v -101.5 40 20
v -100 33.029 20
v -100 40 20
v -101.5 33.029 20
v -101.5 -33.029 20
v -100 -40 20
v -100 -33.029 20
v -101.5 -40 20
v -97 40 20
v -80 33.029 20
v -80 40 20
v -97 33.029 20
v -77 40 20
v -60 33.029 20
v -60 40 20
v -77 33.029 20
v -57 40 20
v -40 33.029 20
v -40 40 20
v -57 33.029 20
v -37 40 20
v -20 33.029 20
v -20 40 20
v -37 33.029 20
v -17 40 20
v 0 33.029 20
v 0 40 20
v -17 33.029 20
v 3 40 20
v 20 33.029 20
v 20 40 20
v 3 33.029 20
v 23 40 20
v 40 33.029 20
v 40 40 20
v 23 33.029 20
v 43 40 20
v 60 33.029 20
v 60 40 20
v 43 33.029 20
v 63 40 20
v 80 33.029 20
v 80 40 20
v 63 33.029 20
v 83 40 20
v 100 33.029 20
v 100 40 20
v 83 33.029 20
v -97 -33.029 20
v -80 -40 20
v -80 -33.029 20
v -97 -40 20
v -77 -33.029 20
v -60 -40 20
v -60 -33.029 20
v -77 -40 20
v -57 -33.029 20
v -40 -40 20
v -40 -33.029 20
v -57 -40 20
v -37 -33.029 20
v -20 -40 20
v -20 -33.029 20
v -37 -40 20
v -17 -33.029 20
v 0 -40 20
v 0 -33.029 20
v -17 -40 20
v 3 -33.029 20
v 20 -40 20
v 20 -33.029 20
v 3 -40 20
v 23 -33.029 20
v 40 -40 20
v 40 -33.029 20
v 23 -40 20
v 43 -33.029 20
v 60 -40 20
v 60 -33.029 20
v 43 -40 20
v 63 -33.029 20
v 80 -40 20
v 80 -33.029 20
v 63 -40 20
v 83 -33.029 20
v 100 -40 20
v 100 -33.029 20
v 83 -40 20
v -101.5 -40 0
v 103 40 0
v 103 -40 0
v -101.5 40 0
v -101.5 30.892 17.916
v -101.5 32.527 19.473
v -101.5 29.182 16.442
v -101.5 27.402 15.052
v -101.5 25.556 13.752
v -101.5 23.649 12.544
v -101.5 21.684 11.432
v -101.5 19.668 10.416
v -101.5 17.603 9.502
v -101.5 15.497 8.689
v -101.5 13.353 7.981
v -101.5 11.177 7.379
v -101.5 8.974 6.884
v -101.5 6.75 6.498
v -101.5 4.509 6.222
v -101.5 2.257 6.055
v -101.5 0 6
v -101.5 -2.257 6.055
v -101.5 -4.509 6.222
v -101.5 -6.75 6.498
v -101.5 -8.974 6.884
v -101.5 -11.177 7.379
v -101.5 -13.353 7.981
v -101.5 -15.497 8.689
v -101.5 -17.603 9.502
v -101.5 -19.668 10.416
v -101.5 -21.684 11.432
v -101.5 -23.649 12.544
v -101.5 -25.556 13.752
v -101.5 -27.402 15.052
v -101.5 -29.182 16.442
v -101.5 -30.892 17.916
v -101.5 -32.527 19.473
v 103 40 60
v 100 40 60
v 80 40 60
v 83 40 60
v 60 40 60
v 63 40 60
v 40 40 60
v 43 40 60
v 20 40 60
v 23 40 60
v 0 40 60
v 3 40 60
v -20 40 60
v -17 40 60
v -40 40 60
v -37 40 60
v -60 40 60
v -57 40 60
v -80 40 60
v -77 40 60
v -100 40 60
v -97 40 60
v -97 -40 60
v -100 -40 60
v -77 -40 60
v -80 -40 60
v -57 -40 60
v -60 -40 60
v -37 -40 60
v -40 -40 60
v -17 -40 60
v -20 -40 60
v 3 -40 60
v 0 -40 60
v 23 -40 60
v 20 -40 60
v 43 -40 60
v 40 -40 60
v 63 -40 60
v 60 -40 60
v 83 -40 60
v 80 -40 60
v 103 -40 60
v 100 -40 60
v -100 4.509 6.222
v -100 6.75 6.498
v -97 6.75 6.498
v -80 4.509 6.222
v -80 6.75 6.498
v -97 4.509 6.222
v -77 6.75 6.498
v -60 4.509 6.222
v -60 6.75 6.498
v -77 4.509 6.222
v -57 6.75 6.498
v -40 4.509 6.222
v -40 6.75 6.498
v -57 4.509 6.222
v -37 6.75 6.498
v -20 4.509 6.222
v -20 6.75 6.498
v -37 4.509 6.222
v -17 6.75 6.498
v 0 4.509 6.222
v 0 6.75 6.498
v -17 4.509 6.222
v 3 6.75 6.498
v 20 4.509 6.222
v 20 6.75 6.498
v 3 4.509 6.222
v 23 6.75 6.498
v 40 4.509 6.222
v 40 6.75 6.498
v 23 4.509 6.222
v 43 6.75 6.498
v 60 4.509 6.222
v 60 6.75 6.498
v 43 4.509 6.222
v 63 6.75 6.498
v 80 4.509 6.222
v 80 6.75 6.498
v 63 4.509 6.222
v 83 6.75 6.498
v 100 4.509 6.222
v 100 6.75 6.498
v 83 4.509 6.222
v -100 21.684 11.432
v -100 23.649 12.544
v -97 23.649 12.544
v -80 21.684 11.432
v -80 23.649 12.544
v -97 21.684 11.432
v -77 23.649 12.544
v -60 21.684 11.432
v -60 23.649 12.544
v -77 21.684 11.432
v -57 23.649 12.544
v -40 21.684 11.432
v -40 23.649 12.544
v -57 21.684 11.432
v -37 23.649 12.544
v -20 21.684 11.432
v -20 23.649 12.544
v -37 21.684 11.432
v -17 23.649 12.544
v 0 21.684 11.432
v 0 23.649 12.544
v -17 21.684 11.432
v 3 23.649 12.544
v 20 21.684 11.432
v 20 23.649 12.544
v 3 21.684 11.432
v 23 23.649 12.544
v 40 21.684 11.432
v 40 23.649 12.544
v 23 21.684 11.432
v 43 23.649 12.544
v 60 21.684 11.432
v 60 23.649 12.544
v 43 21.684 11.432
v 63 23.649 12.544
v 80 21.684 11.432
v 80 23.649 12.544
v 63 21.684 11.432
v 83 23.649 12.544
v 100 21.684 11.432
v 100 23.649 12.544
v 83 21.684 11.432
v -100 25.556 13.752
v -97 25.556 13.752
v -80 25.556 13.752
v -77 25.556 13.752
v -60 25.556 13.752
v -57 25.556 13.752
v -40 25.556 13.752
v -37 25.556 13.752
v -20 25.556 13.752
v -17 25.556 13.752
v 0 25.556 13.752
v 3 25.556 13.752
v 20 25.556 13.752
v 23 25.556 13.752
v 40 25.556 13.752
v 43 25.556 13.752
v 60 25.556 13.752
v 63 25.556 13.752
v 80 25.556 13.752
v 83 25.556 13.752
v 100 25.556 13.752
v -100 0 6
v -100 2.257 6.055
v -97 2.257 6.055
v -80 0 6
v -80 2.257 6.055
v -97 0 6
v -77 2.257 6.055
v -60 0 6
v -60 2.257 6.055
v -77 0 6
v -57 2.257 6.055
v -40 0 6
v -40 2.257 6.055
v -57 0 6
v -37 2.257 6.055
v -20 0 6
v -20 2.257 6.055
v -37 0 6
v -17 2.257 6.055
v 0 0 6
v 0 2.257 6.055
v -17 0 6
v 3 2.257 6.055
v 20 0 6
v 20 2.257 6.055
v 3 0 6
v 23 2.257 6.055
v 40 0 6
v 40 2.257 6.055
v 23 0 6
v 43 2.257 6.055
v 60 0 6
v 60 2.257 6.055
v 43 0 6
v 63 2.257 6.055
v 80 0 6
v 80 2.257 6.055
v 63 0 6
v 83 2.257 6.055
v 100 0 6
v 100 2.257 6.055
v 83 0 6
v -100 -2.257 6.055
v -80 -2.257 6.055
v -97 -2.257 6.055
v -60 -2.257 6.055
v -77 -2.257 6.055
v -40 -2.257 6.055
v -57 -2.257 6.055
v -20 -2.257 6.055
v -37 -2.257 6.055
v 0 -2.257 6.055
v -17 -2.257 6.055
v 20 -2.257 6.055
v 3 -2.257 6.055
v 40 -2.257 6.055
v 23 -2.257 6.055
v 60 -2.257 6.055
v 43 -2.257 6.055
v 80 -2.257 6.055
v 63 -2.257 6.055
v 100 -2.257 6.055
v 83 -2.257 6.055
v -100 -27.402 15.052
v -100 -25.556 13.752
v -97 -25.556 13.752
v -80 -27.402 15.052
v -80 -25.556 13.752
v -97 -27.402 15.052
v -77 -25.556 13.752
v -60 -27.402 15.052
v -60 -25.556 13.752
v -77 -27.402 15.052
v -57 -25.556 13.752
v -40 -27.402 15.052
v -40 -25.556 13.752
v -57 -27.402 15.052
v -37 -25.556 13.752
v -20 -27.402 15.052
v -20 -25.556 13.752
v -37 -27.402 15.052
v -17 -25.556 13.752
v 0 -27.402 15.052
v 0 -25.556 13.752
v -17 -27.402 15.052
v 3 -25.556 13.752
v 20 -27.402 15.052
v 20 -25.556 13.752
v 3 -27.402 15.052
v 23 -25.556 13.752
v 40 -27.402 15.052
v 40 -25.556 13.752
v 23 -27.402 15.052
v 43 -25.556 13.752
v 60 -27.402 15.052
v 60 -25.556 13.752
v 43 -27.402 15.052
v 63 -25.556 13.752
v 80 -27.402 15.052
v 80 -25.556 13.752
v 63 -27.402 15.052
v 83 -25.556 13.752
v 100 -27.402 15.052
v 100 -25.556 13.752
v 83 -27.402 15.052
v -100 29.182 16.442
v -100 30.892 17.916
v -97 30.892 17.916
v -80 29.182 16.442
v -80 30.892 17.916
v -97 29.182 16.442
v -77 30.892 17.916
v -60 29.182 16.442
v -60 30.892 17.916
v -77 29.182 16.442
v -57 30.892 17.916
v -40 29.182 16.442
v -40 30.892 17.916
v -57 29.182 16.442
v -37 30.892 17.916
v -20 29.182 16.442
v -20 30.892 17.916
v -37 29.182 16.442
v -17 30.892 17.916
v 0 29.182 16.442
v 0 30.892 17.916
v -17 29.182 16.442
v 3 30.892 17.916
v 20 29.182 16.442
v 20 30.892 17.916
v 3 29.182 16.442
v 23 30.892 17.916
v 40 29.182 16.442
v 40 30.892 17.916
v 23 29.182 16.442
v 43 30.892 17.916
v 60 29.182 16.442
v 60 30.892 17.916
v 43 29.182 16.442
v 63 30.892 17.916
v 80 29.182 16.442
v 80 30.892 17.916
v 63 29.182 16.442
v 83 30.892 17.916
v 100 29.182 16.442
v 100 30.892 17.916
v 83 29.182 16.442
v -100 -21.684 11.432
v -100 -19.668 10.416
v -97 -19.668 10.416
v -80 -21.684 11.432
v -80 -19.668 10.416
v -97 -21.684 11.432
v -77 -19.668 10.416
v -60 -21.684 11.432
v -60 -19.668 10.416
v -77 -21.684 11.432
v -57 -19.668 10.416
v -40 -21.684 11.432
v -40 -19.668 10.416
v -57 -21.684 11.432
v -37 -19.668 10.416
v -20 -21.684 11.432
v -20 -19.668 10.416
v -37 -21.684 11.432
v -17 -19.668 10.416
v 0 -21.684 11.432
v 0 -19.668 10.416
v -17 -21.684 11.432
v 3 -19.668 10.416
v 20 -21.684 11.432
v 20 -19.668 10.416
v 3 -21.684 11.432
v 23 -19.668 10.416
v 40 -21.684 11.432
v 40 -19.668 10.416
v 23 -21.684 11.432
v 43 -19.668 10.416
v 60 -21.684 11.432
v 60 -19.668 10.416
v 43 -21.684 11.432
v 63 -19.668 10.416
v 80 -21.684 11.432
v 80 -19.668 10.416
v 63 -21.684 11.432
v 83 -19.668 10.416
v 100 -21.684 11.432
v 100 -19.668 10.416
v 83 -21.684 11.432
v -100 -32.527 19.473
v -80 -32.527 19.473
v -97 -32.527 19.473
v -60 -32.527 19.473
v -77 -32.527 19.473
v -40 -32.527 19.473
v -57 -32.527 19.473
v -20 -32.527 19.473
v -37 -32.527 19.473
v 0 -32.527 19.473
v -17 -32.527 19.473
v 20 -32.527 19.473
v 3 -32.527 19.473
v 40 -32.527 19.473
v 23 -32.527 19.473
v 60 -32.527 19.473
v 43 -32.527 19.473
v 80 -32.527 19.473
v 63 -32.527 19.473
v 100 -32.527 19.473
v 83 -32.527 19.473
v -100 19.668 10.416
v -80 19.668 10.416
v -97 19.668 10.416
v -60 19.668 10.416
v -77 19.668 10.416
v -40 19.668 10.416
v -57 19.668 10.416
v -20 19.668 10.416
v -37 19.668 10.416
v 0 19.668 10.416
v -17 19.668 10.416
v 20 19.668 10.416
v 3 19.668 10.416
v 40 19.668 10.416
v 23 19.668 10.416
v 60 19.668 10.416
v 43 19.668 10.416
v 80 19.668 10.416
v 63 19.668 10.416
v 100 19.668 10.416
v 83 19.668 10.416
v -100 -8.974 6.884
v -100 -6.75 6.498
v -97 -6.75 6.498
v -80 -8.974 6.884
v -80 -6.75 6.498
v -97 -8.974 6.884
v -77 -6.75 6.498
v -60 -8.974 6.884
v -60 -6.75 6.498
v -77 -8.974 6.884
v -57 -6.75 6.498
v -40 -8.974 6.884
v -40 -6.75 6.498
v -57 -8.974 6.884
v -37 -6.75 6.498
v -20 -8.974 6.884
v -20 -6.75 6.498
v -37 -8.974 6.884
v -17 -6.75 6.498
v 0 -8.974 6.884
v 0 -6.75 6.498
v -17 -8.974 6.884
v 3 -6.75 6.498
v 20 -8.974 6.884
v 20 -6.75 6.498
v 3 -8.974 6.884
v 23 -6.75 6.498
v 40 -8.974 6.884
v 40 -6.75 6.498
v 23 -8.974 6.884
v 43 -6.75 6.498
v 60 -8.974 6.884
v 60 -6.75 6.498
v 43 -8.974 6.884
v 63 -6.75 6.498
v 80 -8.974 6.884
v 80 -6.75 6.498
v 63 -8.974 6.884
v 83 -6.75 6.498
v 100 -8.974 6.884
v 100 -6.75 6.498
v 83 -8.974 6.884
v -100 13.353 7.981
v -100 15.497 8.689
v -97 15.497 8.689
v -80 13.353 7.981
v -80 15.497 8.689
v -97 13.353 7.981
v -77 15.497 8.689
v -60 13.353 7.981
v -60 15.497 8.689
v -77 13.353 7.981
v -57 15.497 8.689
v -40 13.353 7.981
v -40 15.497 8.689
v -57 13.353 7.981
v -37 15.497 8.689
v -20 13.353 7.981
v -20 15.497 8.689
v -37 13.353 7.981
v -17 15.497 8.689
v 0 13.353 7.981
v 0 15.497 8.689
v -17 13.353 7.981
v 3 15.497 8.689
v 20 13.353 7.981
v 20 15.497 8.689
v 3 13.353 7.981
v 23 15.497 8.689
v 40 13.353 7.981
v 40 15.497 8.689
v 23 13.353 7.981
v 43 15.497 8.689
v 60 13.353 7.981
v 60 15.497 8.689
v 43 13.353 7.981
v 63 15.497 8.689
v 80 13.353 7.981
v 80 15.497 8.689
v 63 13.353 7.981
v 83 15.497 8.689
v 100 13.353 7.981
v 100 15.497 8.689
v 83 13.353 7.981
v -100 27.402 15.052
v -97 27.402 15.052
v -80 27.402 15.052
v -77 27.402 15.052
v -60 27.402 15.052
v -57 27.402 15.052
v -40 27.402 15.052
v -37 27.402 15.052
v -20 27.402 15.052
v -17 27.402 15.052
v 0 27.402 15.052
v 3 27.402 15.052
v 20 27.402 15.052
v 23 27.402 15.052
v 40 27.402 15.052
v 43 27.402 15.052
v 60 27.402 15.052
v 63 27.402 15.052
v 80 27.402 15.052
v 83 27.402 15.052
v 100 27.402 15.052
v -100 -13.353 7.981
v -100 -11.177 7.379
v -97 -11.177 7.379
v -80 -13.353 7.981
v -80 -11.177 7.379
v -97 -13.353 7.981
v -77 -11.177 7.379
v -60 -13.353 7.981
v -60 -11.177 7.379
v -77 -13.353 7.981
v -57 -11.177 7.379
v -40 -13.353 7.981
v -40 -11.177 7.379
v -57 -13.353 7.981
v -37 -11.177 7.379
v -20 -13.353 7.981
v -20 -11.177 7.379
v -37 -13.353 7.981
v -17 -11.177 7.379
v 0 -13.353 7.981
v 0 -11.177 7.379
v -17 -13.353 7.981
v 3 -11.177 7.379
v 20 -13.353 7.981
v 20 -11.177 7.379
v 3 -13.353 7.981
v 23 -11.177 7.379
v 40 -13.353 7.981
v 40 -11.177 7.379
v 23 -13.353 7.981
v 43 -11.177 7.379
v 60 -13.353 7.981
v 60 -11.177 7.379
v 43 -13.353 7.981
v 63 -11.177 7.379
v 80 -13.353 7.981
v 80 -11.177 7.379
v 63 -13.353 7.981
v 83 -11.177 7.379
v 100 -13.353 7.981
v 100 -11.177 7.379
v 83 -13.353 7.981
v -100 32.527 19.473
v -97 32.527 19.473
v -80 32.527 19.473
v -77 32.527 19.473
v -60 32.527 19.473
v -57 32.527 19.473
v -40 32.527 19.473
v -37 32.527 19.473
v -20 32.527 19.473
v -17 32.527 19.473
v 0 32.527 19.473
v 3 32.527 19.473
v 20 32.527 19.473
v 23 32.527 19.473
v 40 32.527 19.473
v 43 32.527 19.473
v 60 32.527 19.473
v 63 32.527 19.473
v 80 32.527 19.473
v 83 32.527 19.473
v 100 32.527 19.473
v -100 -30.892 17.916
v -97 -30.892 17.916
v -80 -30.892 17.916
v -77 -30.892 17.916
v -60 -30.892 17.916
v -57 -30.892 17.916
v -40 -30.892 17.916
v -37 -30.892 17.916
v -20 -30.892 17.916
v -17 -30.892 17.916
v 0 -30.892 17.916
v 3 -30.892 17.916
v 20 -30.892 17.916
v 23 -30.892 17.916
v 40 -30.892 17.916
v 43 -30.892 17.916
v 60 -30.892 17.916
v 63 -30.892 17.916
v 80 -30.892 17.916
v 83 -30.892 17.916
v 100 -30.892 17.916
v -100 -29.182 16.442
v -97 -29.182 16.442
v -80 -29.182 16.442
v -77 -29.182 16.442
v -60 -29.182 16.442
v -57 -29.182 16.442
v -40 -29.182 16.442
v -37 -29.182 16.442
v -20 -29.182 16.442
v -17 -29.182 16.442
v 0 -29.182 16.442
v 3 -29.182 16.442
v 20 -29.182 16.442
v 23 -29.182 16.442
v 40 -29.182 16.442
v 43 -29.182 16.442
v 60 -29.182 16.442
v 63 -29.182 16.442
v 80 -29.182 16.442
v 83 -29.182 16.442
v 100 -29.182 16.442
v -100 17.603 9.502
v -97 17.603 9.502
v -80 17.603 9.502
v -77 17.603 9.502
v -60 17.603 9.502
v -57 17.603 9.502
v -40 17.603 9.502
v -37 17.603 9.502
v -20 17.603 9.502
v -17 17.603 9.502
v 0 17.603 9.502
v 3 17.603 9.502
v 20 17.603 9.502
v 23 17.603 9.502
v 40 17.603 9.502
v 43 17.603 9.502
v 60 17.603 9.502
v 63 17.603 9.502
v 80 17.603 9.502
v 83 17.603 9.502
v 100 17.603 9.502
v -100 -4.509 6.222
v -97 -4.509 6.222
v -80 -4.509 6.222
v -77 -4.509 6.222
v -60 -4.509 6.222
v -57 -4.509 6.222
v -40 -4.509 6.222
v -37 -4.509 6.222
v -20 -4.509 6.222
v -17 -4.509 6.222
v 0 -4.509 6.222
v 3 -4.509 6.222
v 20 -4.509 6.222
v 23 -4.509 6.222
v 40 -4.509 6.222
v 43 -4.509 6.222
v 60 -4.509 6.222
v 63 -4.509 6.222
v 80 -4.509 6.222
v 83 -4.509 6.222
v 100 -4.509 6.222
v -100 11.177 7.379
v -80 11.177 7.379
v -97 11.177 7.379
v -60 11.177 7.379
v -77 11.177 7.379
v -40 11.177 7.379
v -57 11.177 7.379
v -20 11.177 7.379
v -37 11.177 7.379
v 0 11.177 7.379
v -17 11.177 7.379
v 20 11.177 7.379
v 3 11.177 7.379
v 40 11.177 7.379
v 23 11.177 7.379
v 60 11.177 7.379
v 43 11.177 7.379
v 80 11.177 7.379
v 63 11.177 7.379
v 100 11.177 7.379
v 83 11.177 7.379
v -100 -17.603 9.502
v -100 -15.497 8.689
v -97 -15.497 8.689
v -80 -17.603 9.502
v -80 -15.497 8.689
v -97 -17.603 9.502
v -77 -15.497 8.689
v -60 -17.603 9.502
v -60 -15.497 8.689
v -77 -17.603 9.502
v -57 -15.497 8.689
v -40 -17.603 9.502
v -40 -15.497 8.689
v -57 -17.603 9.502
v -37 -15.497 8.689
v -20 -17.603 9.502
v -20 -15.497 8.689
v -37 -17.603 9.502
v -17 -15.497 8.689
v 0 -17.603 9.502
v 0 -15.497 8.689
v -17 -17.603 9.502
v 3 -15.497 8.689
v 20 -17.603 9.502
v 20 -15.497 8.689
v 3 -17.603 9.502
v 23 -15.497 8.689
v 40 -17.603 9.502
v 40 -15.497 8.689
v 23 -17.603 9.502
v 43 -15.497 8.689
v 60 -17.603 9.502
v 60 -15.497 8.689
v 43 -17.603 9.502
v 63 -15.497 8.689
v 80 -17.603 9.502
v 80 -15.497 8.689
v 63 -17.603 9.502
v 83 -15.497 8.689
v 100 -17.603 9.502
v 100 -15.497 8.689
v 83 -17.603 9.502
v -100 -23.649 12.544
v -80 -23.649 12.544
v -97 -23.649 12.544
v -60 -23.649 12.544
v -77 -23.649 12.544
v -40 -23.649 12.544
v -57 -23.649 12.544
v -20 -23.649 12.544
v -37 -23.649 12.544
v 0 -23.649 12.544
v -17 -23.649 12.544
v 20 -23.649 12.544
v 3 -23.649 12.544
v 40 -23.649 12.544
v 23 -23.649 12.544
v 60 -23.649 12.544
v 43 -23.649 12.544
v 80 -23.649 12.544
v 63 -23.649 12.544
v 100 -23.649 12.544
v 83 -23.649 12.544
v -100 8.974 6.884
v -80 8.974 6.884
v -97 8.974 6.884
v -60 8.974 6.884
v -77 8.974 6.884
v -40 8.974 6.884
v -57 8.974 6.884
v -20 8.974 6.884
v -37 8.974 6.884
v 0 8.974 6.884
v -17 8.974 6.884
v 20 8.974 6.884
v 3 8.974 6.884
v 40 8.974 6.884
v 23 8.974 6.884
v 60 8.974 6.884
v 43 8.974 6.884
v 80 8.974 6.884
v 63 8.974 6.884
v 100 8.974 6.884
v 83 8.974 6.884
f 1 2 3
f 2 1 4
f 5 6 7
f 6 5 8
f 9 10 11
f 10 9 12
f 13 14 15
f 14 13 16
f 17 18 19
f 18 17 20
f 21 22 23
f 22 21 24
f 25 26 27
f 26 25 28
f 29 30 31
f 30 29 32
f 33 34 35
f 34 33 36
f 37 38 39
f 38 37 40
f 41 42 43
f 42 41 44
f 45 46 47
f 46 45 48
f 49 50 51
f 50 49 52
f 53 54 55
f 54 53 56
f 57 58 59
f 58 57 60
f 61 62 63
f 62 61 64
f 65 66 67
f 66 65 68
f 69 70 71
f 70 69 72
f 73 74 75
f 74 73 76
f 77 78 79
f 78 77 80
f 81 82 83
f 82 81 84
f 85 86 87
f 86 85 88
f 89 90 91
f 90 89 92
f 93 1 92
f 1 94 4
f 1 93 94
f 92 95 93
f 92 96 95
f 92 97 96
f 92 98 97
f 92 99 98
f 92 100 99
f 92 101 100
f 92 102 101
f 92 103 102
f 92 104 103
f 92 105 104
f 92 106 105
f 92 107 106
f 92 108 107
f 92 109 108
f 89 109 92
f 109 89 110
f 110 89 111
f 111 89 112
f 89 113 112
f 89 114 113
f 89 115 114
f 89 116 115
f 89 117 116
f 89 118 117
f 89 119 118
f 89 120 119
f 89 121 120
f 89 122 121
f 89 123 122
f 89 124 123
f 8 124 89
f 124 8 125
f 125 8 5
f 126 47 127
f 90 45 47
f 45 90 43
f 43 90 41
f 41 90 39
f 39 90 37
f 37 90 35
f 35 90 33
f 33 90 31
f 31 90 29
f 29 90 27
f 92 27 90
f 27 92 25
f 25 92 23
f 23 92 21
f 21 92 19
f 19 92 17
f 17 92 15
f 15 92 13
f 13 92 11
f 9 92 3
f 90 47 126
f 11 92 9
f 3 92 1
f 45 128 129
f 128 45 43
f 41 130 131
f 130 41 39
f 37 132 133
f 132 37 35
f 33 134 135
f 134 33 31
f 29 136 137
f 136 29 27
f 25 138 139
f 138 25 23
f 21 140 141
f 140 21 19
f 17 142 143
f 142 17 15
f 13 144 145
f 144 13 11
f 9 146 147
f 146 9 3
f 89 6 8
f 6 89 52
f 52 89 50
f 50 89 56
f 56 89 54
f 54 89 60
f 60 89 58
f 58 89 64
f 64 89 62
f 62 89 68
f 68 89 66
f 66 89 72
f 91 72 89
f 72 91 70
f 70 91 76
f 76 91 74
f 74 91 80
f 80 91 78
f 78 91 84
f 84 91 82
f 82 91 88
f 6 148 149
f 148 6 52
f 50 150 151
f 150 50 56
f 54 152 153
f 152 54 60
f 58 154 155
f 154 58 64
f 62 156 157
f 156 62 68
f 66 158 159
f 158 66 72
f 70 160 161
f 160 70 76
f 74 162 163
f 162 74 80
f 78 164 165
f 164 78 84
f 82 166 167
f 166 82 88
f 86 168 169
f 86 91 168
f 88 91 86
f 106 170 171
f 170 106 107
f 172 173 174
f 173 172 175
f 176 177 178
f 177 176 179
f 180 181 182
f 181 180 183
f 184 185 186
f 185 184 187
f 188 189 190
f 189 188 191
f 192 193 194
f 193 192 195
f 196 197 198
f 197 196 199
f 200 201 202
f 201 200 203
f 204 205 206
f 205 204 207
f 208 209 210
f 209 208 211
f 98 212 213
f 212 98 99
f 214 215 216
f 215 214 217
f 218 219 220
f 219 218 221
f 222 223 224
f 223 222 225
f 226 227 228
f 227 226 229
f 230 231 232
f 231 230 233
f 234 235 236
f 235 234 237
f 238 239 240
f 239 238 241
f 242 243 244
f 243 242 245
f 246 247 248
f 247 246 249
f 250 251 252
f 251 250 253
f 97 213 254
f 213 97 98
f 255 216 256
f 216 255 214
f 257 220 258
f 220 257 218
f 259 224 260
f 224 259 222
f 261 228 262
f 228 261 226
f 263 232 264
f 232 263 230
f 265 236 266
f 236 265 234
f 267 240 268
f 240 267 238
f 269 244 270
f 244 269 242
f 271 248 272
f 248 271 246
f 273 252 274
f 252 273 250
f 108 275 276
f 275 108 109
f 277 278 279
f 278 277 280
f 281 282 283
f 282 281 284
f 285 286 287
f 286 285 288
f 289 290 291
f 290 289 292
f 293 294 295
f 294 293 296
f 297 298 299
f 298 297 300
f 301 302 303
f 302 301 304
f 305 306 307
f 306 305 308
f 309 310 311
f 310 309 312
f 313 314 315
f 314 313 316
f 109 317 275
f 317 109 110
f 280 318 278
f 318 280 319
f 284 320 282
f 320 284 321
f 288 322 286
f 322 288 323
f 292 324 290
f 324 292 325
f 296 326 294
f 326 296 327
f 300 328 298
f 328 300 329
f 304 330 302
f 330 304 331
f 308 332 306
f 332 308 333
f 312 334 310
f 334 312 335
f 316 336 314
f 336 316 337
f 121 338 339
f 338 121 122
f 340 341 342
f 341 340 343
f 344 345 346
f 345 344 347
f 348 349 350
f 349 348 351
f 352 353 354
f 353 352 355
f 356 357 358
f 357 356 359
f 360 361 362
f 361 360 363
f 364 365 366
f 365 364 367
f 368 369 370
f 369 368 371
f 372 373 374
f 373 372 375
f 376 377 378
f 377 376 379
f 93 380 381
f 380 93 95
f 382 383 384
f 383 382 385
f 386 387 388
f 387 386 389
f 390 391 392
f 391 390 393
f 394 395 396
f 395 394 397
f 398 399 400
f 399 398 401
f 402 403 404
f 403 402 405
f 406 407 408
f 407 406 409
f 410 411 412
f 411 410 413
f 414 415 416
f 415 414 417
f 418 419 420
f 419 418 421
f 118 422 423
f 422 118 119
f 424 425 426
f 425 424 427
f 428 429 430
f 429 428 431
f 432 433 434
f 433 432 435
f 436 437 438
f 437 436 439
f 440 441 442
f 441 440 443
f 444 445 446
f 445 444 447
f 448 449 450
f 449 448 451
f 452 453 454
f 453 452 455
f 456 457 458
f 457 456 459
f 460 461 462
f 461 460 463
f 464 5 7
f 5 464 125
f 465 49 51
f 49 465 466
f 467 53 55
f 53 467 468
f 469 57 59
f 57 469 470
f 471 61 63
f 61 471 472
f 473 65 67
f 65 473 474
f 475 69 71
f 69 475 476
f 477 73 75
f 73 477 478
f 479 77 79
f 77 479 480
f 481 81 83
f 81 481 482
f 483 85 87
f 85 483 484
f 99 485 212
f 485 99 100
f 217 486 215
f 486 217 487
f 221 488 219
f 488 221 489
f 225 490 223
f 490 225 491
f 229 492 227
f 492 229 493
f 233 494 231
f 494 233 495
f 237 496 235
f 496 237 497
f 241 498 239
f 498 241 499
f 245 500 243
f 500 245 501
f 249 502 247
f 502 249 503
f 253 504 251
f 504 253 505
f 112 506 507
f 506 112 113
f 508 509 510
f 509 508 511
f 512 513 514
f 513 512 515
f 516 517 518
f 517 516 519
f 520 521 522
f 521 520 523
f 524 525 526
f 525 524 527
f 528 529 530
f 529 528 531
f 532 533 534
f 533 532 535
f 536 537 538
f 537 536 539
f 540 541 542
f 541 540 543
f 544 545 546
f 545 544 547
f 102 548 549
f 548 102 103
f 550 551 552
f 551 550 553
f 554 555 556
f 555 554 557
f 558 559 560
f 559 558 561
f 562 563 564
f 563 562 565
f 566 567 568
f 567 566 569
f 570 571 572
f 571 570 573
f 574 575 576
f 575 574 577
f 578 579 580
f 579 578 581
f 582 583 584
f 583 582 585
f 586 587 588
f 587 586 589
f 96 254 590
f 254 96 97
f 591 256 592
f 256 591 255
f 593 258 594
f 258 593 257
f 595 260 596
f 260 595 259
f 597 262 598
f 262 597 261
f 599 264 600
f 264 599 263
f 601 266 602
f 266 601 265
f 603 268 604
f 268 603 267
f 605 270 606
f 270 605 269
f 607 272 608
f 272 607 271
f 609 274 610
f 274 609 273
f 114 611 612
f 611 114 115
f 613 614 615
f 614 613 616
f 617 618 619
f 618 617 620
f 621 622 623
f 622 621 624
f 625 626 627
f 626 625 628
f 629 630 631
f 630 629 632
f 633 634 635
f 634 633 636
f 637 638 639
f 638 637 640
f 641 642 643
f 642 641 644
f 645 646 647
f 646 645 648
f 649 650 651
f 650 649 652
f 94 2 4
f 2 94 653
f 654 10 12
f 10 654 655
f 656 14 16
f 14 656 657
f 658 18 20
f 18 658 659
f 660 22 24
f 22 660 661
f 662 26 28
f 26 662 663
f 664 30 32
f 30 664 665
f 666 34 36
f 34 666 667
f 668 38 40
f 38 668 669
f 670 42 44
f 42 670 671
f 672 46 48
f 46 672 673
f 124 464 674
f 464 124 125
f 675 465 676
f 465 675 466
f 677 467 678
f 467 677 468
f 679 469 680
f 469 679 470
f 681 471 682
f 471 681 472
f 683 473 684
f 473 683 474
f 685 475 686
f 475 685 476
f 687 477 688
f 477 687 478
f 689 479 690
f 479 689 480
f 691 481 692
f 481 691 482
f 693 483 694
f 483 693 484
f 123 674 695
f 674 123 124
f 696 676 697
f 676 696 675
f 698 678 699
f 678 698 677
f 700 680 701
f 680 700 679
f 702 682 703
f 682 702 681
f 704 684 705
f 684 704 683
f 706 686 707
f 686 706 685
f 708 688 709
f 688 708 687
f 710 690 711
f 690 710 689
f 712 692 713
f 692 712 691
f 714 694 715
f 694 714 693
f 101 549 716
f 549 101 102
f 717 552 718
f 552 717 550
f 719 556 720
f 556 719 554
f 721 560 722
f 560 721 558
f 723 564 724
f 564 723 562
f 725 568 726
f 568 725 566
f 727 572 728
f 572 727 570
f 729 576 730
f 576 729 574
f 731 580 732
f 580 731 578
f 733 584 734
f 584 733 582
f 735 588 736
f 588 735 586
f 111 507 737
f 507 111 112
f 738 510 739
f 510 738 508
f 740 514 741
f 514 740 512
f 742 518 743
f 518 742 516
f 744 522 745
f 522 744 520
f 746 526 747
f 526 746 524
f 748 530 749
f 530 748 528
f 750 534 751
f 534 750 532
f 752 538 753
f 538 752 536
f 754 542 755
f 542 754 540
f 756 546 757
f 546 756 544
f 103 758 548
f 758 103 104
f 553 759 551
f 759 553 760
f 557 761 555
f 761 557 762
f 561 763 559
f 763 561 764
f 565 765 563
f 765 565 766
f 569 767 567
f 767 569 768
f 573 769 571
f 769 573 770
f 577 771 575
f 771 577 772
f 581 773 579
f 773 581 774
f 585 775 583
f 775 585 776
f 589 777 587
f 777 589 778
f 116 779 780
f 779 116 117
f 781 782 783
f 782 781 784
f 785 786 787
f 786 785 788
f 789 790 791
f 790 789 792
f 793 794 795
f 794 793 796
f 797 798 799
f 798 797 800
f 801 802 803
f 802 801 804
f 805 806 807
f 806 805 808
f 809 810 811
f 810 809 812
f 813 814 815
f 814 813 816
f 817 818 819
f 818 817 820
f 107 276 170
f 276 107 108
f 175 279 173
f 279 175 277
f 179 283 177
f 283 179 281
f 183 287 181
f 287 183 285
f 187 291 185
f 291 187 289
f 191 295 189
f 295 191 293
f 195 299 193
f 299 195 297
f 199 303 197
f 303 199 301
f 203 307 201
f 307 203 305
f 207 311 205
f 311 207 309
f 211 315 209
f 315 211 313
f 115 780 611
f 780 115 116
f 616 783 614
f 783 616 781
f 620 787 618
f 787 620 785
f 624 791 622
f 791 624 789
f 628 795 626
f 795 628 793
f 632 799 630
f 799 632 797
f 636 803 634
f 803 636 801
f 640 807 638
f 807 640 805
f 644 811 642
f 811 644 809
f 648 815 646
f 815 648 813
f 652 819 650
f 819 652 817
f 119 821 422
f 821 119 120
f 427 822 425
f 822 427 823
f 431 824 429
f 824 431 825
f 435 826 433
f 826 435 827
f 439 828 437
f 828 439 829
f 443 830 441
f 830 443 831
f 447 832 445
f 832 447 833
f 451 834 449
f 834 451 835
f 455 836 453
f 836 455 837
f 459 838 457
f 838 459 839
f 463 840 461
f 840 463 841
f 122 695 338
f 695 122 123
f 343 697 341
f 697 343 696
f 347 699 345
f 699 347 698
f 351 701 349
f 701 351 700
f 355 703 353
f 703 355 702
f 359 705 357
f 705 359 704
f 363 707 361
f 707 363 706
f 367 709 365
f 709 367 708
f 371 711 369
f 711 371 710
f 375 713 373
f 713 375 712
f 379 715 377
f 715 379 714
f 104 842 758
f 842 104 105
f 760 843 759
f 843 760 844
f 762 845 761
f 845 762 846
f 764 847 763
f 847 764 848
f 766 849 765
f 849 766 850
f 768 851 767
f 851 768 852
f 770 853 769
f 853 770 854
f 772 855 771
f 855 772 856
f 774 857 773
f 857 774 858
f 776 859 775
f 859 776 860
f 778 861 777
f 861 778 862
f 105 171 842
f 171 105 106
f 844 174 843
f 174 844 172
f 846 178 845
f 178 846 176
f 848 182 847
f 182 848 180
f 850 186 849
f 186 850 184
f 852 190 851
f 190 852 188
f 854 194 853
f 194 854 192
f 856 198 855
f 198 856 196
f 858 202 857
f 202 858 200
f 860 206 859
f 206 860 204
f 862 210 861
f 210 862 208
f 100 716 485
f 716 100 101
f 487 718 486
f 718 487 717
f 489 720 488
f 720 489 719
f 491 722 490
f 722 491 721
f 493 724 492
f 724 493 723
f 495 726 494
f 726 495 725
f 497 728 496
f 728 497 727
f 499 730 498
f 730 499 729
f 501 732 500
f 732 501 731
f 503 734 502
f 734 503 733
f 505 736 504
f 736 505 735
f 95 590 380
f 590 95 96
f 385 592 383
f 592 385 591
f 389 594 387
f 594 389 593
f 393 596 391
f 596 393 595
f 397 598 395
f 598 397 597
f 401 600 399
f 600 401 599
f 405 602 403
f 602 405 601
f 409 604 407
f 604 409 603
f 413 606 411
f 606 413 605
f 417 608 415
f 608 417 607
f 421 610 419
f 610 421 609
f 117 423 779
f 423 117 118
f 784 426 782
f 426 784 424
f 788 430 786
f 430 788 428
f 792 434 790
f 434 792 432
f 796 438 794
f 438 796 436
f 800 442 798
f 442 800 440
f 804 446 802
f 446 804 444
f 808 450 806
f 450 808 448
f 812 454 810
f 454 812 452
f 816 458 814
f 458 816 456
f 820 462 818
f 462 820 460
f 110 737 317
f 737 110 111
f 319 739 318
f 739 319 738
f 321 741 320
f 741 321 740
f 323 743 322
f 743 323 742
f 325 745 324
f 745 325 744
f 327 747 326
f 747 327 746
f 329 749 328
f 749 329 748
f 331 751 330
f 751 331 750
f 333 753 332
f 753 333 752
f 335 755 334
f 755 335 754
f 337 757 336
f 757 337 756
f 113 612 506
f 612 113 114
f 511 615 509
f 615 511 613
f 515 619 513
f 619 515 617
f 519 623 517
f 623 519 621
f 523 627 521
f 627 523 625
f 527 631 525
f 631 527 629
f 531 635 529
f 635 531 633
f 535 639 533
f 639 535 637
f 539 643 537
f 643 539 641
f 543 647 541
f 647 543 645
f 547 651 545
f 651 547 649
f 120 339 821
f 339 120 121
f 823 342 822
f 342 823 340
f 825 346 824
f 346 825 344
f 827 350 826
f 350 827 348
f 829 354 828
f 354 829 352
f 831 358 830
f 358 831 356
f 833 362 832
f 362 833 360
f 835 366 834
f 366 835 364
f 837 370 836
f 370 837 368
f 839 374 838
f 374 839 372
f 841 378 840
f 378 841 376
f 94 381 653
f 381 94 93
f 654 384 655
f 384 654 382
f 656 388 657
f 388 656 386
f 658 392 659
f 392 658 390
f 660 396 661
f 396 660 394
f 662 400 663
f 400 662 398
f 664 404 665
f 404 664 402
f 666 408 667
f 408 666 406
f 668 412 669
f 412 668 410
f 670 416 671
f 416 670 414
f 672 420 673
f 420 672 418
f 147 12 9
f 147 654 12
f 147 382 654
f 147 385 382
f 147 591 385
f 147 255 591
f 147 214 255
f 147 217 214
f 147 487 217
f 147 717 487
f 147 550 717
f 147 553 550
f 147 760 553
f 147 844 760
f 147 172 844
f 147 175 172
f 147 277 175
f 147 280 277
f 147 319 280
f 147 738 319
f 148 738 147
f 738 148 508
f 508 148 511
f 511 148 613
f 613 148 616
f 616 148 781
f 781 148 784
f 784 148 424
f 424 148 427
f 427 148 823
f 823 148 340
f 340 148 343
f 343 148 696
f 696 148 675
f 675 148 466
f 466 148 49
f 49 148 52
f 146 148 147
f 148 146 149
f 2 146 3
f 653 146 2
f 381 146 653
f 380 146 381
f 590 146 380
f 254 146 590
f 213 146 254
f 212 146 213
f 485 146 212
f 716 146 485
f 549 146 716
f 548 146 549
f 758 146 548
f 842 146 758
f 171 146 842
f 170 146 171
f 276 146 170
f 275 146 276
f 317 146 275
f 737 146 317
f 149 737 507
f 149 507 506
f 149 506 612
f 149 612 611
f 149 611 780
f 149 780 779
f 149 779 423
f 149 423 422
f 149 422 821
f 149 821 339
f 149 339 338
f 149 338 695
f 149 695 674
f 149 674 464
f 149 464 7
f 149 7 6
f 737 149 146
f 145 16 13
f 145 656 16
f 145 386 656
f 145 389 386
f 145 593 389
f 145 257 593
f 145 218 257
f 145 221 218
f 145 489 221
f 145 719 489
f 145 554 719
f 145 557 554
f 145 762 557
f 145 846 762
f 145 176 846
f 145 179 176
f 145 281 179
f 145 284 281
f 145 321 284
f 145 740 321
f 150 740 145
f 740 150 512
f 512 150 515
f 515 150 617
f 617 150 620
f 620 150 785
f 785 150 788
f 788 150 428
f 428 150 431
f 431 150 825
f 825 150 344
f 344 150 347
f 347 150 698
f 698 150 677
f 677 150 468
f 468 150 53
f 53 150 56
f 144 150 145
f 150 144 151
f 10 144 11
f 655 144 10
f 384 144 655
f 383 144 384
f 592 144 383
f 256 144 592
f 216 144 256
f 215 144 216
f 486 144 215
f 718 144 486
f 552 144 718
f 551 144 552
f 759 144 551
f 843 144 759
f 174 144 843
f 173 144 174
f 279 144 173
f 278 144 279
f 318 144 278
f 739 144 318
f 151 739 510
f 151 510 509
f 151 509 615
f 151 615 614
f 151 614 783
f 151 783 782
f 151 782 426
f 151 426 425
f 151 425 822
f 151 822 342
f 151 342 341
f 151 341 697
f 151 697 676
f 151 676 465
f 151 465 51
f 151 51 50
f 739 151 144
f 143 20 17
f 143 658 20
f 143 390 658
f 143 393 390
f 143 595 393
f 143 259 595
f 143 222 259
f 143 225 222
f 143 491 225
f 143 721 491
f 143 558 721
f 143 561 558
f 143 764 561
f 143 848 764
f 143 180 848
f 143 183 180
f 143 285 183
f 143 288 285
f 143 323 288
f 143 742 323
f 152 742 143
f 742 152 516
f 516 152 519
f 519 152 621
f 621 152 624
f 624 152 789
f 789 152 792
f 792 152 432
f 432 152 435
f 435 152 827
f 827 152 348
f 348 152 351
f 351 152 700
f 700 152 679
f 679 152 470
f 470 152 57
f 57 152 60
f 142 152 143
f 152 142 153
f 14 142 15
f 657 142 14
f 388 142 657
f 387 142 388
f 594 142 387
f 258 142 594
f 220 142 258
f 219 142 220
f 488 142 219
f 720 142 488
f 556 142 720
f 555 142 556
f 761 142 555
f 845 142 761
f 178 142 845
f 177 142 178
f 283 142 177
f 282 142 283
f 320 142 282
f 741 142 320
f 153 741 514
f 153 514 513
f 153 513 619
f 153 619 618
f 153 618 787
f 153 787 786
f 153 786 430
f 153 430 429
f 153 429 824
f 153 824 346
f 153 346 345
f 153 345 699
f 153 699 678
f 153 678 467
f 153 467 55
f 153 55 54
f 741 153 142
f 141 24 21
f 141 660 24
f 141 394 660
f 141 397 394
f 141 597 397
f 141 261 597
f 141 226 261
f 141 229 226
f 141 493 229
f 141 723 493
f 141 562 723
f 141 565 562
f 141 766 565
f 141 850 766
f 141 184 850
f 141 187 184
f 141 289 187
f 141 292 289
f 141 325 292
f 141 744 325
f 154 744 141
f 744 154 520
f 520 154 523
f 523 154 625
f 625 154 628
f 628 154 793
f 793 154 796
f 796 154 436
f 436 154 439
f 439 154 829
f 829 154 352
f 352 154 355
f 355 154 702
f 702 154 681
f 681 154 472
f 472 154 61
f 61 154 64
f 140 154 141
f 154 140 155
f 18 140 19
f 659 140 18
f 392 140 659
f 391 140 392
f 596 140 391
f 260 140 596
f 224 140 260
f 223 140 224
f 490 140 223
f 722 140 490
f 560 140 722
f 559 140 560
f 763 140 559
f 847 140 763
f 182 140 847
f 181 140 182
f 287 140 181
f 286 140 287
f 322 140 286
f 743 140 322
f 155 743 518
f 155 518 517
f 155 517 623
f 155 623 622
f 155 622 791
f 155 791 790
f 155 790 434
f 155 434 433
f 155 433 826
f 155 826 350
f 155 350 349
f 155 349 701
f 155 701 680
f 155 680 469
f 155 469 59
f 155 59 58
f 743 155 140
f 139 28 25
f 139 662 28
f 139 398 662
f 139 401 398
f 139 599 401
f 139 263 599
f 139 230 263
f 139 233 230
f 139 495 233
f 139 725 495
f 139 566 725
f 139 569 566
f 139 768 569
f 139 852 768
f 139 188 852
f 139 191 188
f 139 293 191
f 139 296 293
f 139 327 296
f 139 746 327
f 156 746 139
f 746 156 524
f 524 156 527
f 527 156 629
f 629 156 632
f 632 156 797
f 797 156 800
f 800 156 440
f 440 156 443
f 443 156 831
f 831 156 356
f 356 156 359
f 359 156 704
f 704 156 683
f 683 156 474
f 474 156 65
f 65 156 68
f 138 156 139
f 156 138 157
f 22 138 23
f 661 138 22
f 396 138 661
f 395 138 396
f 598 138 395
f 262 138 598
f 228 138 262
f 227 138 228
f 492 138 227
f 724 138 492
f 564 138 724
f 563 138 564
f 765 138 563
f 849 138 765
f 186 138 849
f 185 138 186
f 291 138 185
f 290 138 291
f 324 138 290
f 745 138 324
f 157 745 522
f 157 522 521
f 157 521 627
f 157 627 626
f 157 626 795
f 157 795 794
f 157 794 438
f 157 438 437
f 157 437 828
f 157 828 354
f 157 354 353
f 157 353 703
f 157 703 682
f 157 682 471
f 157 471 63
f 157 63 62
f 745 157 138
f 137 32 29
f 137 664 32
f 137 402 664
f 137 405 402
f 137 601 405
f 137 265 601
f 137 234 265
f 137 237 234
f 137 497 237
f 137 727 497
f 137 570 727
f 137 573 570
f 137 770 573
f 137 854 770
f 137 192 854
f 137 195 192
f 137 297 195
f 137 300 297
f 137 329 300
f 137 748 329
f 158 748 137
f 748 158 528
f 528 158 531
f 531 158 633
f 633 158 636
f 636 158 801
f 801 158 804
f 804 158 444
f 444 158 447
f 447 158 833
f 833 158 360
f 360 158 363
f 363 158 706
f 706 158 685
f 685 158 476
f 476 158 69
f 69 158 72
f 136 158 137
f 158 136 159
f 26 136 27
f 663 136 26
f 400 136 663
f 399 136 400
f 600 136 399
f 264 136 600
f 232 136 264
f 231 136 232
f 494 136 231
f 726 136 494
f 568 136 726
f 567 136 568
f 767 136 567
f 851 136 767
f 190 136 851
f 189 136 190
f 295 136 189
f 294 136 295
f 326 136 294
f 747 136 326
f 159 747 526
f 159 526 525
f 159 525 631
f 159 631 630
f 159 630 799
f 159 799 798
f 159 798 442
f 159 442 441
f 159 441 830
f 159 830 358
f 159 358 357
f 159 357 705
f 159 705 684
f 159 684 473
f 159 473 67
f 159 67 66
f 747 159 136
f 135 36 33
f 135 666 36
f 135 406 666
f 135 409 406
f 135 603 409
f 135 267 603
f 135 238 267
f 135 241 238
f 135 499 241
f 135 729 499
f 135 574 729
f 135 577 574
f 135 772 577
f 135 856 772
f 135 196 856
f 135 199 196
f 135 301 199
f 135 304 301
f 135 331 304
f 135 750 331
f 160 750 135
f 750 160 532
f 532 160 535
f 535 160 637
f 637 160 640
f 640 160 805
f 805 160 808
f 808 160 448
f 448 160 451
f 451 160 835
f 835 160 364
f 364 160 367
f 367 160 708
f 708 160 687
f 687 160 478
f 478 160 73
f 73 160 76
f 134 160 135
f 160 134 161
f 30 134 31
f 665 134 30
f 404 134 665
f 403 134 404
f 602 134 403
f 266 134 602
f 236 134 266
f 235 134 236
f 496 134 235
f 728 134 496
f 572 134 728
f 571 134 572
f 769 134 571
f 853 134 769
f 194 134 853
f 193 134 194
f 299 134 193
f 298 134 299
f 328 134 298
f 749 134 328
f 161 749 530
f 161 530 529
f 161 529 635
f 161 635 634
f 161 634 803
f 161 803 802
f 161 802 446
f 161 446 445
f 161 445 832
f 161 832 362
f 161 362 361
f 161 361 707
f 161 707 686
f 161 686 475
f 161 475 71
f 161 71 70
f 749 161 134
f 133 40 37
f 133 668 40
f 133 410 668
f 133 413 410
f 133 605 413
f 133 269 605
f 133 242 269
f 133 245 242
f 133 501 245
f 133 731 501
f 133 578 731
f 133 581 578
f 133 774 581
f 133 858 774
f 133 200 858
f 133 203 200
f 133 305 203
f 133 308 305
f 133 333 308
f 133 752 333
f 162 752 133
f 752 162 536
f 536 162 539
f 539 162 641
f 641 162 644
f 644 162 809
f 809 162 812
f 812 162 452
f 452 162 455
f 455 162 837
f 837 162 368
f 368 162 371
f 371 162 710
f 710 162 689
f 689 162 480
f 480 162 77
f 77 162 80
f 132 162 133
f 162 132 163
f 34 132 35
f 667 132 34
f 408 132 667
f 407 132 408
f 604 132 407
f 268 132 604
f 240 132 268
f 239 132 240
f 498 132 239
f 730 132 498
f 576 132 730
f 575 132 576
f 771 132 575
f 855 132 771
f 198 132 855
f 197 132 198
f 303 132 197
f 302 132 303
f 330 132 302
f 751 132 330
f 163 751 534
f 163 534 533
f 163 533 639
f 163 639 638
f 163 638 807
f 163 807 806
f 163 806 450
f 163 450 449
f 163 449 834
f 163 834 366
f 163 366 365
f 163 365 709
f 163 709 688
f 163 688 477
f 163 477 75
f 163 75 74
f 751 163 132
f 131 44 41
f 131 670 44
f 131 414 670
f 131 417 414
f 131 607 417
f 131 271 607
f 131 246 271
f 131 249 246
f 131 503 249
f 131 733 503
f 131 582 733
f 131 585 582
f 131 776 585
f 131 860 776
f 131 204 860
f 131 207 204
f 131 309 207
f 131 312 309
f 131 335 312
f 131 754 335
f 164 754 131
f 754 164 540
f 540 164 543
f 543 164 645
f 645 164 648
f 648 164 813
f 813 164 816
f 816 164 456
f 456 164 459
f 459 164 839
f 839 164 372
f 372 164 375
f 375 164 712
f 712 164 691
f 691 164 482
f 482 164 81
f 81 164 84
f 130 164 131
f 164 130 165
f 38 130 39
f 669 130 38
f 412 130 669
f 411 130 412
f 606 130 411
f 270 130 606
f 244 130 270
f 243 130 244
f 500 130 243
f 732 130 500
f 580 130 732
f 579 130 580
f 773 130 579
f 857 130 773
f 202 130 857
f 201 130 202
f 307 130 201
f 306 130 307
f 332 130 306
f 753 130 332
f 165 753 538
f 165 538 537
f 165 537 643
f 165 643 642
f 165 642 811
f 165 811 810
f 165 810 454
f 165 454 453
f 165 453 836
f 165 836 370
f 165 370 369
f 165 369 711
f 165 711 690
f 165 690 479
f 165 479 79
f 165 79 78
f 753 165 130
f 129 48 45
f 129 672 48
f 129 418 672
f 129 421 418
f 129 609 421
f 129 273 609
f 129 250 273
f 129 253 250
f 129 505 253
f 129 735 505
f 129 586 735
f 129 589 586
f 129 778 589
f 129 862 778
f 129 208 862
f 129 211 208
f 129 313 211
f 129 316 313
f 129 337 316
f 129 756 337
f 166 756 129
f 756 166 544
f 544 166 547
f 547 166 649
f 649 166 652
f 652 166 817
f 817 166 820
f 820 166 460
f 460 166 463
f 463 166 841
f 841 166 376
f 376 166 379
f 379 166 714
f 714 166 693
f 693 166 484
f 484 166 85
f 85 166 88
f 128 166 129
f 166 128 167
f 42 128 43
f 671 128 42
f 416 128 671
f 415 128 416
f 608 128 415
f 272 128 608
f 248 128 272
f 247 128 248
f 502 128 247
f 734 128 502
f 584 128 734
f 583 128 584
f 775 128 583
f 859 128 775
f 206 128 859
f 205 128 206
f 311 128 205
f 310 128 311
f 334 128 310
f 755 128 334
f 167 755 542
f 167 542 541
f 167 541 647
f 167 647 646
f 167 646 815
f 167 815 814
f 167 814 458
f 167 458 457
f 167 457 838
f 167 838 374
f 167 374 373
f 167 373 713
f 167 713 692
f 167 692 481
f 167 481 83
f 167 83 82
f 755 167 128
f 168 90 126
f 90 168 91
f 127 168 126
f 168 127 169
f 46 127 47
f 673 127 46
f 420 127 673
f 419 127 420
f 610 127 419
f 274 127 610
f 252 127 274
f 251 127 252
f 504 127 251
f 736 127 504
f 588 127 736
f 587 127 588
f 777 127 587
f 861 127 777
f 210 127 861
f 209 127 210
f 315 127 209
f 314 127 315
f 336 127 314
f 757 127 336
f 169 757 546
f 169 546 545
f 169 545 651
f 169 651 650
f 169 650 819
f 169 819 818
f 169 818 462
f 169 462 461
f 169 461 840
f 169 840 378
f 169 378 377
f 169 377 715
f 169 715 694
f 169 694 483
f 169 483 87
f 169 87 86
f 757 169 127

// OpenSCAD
// Petri Dish Rack
// Designed for 90mm diameter dishes standing on edge.

// --- Dimensions ---
base_l      = 203.0;  // Length of base (X)
base_w      = 80.0;   // Width of base (Y)
base_h      = 20.0;   // Height of base (Z)

dish_radius = 45.0;   // Radius of 90mm dish
cradle_r    = 46.0;   // Radius of the cutting cylinder
cradle_z    = 52.0;   // Z-offset of the cylinder axis (bottoms at 52-46=6mm)

num_dividers = 11;     // Number of vertical plates
divider_t    = 3.0;    // Thickness of each divider (X)
divider_h    = 60.0;   // Height of dividers (Z)
divider_w    = 80.0;   // Width of dividers (Y)

// Spacing calculation: 
// 11 dividers create 10 slots. 
// Total length covered by dividers is from -100 to 100.
x_start      = -100.0;
x_end        = 100.0;
x_step       = 20.0;

$fn = 128;

// --- Modeling ---

// The base block
module base() {
    // Centered on X and Y, sitting on Z=0
    translate([-base_l/2, -base_w/2, 0])
        cube([base_l, base_w, base_h]);
}

// The vertical dividers
module dividers() {
    for (i = [0 : num_dividers - 1]) {
        x_pos = x_start + (i * x_step);
        translate([x_pos, -divider_w/2, 0])
            cube([divider_t, divider_w, divider_h]);
    }
}

// The cradle (the curved groove)
module cradle_cutter() {
    // To place a cylinder axis at (y=0, z=52) running along X:
    // 1. We want the cylinder to be centered on X. 
    // 2. We rotate it to lie along X.
    // 3. We translate it to the target Z and Y.
    // 4. We translate it along X by half its length so its center is at x=0.
    
    cylinder_len = base_l + 2;
    translate([0, 0, cradle_z]) // Move to Z axis height
        rotate([0, 90, 0])      // Rotate to lie along X
            translate([0, 0, -cylinder_len/2]) // Center the cylinder on X=0
                cylinder(h = cylinder_len, d = cradle_r * 2);
}

// Final Assembly
// Rule: "The cradle is not cut through them [the dividers]"
// We use union of (Base - Cradle) and (Dividers).

union() {
    // Part 1: The base with the cradle cut out
    difference() {
        base();
        // Subtract the cradle cutter from the base
        cradle_cutter();
    }
    
    // Part 2: The solid dividers
    dividers();
}
